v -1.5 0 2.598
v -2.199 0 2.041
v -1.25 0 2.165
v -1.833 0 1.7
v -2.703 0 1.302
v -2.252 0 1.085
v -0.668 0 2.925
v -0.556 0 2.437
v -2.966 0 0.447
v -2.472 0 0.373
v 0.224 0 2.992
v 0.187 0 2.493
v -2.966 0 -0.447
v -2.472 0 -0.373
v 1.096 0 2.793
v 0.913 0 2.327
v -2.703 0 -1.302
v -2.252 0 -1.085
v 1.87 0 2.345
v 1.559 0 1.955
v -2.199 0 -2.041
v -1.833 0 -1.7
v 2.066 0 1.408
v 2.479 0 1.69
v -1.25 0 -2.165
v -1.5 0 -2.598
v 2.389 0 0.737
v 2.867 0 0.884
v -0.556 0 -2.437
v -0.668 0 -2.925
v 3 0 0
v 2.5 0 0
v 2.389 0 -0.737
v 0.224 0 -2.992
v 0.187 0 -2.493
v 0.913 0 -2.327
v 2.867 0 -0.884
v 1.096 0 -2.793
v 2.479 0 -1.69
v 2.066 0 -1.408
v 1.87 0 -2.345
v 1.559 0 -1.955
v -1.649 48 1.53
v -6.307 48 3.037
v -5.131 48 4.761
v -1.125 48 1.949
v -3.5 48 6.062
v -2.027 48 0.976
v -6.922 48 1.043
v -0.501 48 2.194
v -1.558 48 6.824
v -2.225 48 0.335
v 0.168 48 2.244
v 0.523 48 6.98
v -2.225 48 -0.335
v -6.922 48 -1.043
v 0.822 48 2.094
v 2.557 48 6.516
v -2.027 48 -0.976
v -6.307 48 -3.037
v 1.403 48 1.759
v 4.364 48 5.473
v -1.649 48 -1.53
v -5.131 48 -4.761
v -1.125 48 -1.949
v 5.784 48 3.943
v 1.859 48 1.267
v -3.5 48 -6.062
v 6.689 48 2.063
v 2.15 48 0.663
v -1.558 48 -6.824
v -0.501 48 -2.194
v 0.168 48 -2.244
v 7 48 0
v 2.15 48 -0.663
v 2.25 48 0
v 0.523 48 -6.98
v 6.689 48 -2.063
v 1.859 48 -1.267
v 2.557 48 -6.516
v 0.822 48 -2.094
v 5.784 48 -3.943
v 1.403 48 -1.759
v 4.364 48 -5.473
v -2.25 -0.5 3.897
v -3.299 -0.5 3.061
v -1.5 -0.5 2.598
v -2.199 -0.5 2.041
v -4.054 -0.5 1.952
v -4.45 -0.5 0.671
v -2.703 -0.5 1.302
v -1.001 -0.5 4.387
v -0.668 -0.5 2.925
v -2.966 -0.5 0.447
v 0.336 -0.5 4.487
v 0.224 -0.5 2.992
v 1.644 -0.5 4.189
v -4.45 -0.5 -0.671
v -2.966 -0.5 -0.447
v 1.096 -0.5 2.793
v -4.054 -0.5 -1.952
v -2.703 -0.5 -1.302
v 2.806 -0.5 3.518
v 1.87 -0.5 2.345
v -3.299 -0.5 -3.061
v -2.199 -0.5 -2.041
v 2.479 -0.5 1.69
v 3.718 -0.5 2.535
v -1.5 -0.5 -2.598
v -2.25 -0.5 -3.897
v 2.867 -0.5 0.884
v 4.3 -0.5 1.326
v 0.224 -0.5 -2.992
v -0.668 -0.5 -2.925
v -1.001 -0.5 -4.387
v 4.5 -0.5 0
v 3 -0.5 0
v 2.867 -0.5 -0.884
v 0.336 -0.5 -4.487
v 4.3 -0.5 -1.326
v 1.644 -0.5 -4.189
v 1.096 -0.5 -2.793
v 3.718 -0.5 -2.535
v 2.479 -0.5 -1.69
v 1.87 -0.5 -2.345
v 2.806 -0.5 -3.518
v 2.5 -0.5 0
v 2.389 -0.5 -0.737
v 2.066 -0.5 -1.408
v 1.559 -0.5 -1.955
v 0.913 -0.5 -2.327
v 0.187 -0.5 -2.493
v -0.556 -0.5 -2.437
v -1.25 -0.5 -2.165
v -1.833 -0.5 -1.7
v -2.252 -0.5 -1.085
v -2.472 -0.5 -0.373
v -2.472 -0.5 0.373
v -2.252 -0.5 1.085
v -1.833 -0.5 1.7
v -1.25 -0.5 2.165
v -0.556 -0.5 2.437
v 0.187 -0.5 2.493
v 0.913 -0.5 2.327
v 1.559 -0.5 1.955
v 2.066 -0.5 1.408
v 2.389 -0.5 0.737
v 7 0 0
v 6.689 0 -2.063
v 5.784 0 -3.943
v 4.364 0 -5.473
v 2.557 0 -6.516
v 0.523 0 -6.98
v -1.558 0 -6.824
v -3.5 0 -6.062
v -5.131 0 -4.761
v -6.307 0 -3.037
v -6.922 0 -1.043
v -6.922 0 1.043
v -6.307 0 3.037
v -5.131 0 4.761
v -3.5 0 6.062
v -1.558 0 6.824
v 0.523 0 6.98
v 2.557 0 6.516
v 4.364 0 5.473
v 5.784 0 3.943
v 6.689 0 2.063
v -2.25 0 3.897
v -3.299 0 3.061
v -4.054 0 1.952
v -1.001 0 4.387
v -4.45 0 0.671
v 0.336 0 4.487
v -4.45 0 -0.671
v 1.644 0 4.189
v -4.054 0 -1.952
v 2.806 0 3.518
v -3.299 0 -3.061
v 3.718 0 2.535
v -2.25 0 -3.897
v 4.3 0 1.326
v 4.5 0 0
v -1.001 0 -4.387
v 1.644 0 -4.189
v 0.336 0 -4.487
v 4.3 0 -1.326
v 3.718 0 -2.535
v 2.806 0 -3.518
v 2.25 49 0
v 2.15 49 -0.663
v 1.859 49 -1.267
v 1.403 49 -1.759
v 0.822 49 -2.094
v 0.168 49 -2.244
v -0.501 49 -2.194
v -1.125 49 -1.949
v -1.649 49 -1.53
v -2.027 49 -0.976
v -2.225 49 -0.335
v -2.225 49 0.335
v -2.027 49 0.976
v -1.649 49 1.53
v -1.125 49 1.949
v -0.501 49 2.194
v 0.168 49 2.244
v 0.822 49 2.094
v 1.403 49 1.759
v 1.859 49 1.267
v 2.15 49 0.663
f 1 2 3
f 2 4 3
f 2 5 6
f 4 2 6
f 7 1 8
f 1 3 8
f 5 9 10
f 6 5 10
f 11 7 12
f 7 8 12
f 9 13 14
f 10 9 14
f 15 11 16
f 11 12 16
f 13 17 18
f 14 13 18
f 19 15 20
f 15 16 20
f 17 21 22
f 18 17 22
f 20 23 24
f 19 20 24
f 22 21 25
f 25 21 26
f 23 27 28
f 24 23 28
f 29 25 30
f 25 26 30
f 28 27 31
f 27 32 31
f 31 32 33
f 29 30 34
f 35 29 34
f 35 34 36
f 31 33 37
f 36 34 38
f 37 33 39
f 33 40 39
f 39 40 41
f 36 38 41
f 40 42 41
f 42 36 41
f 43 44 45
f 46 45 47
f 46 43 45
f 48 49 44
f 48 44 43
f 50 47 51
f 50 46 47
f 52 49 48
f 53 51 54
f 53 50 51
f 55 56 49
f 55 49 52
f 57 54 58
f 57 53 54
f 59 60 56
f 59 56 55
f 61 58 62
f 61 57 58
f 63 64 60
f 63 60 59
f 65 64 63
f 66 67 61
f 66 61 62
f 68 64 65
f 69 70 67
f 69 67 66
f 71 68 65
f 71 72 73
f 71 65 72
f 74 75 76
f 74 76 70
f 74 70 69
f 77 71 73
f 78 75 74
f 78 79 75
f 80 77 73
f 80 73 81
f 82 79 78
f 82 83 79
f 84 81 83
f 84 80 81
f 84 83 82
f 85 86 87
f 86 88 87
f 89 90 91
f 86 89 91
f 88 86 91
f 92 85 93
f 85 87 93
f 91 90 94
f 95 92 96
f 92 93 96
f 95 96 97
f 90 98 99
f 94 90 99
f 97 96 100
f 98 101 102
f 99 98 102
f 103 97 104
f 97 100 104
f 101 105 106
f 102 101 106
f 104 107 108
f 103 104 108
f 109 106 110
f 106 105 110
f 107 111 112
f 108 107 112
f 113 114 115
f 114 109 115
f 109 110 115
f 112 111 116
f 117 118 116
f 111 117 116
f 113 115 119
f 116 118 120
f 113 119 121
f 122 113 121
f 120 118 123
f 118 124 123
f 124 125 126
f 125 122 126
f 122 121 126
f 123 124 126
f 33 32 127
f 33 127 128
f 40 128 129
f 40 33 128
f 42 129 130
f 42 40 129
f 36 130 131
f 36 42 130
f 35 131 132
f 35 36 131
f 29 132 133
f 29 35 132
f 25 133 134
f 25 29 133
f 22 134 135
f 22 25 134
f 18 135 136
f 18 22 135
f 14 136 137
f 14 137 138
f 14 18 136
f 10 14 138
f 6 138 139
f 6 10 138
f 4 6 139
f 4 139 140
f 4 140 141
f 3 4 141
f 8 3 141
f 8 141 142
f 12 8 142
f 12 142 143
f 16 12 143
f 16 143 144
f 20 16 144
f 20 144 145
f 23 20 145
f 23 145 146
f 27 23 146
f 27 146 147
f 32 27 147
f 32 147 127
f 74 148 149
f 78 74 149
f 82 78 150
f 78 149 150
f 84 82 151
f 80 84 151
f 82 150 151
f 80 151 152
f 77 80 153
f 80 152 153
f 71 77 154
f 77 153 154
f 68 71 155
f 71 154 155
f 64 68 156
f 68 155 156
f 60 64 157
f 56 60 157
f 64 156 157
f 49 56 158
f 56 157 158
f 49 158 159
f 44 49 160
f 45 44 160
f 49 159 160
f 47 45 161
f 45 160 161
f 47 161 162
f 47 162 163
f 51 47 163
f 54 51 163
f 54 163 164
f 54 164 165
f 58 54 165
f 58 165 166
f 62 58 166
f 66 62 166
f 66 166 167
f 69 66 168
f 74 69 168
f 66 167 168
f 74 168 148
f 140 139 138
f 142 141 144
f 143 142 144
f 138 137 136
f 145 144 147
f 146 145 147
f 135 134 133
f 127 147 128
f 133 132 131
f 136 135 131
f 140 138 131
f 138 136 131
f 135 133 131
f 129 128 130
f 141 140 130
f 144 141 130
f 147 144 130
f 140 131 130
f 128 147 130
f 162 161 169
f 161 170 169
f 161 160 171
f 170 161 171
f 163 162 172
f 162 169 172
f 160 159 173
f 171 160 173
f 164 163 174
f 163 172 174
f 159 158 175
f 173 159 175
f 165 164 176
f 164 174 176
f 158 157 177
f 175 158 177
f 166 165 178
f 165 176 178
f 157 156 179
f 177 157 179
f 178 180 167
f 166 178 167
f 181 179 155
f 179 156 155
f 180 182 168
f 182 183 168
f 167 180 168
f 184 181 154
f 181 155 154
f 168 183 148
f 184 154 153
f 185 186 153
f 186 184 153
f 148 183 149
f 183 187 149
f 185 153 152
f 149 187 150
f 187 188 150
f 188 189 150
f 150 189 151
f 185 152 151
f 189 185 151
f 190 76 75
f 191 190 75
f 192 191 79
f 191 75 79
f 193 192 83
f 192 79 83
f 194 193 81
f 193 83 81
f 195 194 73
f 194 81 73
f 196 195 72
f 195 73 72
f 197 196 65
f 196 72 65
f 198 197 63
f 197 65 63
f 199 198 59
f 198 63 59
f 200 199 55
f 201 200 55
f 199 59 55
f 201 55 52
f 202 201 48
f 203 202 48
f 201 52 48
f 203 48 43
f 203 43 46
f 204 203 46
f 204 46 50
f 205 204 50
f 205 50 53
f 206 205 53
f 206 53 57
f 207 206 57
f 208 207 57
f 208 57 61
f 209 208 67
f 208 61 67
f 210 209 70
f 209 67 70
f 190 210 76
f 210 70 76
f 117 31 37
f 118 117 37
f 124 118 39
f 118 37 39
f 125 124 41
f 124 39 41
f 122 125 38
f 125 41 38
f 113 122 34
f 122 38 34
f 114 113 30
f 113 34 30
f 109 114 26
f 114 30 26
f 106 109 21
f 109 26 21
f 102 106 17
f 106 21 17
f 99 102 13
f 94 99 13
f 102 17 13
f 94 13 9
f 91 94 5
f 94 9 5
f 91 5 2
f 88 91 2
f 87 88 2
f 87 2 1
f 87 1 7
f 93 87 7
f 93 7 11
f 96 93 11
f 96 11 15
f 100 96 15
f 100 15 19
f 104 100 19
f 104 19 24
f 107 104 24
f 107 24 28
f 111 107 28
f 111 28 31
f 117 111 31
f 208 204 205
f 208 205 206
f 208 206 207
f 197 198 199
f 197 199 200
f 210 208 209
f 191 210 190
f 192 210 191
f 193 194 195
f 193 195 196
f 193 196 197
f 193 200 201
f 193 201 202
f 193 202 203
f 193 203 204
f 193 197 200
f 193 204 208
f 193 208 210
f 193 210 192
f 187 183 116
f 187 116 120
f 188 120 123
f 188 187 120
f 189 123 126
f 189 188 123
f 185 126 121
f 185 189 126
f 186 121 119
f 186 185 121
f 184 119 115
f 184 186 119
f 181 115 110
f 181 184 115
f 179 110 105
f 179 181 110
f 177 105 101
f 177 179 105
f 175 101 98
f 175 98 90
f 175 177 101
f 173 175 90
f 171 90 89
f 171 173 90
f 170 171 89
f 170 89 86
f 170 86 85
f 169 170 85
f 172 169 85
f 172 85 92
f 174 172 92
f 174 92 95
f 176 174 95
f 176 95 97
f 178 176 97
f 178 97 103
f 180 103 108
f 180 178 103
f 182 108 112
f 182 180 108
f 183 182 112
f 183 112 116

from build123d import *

# Parameters (mm, degrees)
SKETCH1_R           = 7
BOSS_EXTRUDE1_DEPTH = 48
SKETCH2_R           = 2.25
BOSS_EXTRUDE2_DEPTH = 1
SKETCH3_R           = 4.5
BOSS_EXTRUDE3_DEPTH = 0.5
SKETCH4_R           = 3
SKETCH4_R_2         = 2.5
CUT_EXTRUDE1_DEPTH  = 1.5


with BuildPart() as part:
    # Sketch1 → Boss-Extrude1 (new body)
    with BuildSketch(Plane(origin=(0, 0, 0), x_dir=(1, 0, 0), z_dir=(0, 1, 0))):
        Circle(SKETCH1_R)
    extrude(amount=BOSS_EXTRUDE1_DEPTH)

    # Sketch2 → Boss-Extrude2 (add)
    with BuildSketch(Plane(origin=(0, 48, 0), x_dir=(1, 0, 0), z_dir=(0, 1, 0))):
        Circle(SKETCH2_R)
    extrude(amount=BOSS_EXTRUDE2_DEPTH)

    # Sketch3 → Boss-Extrude3 (add)
    with BuildSketch(Plane(origin=(0, 0, 0), x_dir=(1, 0, 0), z_dir=(0, 1, 0))):
        Circle(SKETCH3_R)
    extrude(amount=-BOSS_EXTRUDE3_DEPTH)

    # Sketch4 → Cut-Extrude1 (cut, through all)
    with BuildSketch(Plane(origin=(0, 0, 0), x_dir=(1, 0, 0), z_dir=(0, 1, 0))):
        Circle(SKETCH4_R)
        Circle(SKETCH4_R_2, mode=Mode.SUBTRACT)
    extrude(amount=-CUT_EXTRUDE1_DEPTH, mode=Mode.SUBTRACT)


solid = part.part
